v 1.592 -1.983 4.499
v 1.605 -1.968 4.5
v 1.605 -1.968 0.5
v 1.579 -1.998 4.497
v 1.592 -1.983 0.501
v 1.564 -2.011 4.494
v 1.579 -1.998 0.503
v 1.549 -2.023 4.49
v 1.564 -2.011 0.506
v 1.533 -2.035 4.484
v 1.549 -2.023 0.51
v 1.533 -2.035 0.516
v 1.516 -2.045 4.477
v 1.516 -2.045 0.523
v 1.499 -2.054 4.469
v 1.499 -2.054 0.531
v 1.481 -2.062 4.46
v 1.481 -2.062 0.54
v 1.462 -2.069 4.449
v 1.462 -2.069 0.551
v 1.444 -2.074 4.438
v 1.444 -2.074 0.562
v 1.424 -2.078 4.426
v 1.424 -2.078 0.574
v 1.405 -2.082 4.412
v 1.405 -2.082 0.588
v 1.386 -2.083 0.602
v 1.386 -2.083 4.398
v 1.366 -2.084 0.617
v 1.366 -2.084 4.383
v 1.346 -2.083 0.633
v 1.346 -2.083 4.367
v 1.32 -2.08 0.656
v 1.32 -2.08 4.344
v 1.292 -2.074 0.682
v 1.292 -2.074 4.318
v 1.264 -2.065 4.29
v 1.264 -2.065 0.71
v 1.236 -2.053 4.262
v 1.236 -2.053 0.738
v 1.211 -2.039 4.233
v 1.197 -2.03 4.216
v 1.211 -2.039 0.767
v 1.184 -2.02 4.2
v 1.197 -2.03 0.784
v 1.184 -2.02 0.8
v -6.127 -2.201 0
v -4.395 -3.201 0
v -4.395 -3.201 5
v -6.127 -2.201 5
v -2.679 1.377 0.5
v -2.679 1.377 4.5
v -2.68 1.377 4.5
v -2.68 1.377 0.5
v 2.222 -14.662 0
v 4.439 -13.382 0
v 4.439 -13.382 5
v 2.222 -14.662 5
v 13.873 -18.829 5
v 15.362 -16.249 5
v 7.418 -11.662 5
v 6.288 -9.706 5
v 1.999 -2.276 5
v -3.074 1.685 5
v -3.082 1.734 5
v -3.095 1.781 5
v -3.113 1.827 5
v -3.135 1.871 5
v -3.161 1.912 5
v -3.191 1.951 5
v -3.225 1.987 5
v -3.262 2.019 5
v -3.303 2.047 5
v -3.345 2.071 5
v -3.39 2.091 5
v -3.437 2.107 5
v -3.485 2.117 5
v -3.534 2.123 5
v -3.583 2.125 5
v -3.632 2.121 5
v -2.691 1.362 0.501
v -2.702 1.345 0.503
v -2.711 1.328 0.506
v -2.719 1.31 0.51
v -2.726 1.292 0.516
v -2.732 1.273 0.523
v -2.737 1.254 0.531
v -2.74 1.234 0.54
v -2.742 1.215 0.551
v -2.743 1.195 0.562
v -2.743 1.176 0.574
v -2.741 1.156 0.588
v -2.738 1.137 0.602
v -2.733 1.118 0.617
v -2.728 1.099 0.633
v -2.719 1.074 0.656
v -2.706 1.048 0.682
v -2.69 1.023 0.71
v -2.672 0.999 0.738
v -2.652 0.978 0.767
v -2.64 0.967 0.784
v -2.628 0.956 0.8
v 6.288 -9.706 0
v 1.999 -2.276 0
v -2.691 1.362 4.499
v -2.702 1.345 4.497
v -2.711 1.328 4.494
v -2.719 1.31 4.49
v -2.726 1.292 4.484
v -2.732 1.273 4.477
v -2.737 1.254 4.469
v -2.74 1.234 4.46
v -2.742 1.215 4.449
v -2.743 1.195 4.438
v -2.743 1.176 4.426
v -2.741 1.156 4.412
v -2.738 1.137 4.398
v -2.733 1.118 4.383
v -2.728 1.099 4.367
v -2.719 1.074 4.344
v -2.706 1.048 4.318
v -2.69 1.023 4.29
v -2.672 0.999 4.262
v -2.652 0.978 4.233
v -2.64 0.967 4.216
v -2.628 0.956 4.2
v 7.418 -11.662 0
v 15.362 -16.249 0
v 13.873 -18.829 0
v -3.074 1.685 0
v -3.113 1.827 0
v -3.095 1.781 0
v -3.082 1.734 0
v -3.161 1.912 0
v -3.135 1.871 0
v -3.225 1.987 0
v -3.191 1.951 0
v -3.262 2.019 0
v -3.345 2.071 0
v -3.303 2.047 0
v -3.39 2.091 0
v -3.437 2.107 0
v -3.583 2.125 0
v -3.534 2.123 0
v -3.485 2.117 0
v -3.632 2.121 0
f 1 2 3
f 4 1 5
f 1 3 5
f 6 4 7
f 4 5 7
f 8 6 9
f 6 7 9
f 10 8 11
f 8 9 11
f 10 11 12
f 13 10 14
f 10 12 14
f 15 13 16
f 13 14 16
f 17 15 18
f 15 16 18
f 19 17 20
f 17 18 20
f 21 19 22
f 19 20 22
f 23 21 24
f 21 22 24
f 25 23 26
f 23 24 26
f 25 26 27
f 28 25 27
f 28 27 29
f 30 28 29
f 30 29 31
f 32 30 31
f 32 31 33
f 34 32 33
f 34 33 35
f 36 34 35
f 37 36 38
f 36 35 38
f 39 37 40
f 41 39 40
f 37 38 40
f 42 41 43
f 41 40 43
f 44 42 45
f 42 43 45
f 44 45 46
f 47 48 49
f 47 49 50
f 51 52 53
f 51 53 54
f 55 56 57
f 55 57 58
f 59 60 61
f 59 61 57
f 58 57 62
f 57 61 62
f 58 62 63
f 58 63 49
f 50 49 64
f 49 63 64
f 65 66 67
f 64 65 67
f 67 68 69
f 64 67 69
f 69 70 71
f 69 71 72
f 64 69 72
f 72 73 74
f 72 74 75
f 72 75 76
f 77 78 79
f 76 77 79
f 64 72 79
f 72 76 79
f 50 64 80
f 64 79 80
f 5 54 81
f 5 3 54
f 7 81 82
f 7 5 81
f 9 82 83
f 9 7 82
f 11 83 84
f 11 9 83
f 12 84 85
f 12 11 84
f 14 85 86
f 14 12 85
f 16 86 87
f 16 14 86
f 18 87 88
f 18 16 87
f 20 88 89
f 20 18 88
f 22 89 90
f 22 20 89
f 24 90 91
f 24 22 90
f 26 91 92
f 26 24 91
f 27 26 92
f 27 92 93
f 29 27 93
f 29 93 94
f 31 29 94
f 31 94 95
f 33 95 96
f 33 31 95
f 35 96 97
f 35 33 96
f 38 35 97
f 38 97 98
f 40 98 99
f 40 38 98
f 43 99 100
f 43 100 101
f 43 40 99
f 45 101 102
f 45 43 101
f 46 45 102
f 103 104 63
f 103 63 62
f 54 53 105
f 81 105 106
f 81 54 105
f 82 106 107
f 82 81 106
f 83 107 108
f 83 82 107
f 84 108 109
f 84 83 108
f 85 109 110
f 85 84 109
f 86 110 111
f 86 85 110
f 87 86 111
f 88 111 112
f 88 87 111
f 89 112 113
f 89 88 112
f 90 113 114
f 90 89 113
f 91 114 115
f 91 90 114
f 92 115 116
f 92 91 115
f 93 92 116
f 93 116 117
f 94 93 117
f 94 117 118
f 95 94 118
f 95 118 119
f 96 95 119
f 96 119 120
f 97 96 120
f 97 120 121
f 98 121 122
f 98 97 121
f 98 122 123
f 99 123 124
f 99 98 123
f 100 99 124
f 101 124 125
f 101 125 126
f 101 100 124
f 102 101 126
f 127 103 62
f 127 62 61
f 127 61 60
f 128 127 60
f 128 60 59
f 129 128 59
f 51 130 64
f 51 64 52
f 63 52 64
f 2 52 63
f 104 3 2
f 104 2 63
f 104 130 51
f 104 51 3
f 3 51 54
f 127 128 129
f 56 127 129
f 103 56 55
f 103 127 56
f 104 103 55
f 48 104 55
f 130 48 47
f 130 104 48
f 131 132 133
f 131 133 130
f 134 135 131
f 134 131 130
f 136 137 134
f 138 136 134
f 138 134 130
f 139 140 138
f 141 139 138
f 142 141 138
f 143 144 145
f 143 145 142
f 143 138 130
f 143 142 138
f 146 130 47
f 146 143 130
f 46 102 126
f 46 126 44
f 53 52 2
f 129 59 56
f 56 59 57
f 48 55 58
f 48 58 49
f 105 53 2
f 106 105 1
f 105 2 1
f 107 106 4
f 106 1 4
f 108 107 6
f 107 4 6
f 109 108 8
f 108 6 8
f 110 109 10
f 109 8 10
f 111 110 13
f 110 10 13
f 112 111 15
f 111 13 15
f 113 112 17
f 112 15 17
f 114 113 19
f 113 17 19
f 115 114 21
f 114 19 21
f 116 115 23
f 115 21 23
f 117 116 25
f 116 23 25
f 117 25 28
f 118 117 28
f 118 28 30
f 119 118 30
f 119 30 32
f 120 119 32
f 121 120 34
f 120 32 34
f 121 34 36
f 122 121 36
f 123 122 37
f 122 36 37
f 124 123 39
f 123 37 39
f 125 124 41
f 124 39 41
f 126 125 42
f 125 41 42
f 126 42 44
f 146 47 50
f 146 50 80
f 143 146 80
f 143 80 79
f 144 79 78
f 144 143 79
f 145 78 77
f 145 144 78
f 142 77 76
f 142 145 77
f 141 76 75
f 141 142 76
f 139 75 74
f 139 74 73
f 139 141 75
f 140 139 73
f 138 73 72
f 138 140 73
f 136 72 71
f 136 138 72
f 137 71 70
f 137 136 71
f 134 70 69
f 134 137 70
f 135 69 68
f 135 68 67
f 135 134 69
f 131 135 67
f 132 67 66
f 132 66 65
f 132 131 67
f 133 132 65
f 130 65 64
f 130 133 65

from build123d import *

# Parameters (mm, degrees)
EXTRUDE_1_DEPTH     = 5
SKETCH_2_W          = 5.436001784
SKETCH_2_H          = 4
CUT_EXTRUDE_1_DEPTH = 0.3
FILLET_2_R          = 0.3
EXTRUDE_2_DEPTH     = 5


with BuildPart() as part:
    # 草图1 → 凸台-拉伸1 (new body)
    with BuildSketch(Plane.XY):
        with BuildLine():
            Line((-6.127180226, -2.201181898), (-3.631722259, 2.12107809))
            ThreePointArc((-3.631722259, 2.12107809), (-3.262353303, 2.018731118), (-3.073540248, 1.685177587))
            Line((-3.073540248, 1.685177587), (1.998975947, -2.27609726))
            Line((1.998975947, -2.27609726), (6.288373272, -9.705551361))
            Line((6.288373272, -9.705551361), (7.418073814, -11.662250097))
            Line((7.418073814, -11.662250097), (2.221921391, -14.662250097))
            Line((2.221921391, -14.662250097), (-4.395129419, -3.201181898))
            Line((-4.395129419, -3.201181898), (-6.127180226, -2.201181898))
        make_face()
    extrude(amount=EXTRUDE_1_DEPTH)

    # 草图2 → 切除-拉伸1 (cut)
    with BuildSketch(Plane(origin=(-0.346861308, -0.444164989, 0), x_dir=(0.7881471083112889, -0.6154869094144516, 0), z_dir=(0.6154869094144517, 0.788147108311289, 0))):
        with Locations((-0.241605711, -2.5)):
            Rectangle(SKETCH_2_W, SKETCH_2_H)
    extrude(amount=-CUT_EXTRUDE_1_DEPTH, mode=Mode.SUBTRACT)

    # 圆角2
    fillet_2_edges = [part.edges().sort_by_distance(p)[0] for p in [
        (-2.864112767, 1.14099, 2.5),
        (-0.721928223, -0.531903969, 0.5),
        (1.42025632, -2.204797938, 2.5),
        (-0.721928223, -0.531903969, 4.5),
    ]]
    fillet(fillet_2_edges, radius=FILLET_2_R - 0.0001)  # a hair under: the kernel refuses the full size

    # 草图3 → 凸台-拉伸2 (add)
    with BuildSketch(Plane.XY.offset(5)):
        Polygon((7.418073814, -11.662250097), (15.362099483, -16.248735455), (13.872535789, -18.828735455), (4.438946425, -13.382250097), align=None)
    extrude(amount=-EXTRUDE_2_DEPTH)


solid = part.part
